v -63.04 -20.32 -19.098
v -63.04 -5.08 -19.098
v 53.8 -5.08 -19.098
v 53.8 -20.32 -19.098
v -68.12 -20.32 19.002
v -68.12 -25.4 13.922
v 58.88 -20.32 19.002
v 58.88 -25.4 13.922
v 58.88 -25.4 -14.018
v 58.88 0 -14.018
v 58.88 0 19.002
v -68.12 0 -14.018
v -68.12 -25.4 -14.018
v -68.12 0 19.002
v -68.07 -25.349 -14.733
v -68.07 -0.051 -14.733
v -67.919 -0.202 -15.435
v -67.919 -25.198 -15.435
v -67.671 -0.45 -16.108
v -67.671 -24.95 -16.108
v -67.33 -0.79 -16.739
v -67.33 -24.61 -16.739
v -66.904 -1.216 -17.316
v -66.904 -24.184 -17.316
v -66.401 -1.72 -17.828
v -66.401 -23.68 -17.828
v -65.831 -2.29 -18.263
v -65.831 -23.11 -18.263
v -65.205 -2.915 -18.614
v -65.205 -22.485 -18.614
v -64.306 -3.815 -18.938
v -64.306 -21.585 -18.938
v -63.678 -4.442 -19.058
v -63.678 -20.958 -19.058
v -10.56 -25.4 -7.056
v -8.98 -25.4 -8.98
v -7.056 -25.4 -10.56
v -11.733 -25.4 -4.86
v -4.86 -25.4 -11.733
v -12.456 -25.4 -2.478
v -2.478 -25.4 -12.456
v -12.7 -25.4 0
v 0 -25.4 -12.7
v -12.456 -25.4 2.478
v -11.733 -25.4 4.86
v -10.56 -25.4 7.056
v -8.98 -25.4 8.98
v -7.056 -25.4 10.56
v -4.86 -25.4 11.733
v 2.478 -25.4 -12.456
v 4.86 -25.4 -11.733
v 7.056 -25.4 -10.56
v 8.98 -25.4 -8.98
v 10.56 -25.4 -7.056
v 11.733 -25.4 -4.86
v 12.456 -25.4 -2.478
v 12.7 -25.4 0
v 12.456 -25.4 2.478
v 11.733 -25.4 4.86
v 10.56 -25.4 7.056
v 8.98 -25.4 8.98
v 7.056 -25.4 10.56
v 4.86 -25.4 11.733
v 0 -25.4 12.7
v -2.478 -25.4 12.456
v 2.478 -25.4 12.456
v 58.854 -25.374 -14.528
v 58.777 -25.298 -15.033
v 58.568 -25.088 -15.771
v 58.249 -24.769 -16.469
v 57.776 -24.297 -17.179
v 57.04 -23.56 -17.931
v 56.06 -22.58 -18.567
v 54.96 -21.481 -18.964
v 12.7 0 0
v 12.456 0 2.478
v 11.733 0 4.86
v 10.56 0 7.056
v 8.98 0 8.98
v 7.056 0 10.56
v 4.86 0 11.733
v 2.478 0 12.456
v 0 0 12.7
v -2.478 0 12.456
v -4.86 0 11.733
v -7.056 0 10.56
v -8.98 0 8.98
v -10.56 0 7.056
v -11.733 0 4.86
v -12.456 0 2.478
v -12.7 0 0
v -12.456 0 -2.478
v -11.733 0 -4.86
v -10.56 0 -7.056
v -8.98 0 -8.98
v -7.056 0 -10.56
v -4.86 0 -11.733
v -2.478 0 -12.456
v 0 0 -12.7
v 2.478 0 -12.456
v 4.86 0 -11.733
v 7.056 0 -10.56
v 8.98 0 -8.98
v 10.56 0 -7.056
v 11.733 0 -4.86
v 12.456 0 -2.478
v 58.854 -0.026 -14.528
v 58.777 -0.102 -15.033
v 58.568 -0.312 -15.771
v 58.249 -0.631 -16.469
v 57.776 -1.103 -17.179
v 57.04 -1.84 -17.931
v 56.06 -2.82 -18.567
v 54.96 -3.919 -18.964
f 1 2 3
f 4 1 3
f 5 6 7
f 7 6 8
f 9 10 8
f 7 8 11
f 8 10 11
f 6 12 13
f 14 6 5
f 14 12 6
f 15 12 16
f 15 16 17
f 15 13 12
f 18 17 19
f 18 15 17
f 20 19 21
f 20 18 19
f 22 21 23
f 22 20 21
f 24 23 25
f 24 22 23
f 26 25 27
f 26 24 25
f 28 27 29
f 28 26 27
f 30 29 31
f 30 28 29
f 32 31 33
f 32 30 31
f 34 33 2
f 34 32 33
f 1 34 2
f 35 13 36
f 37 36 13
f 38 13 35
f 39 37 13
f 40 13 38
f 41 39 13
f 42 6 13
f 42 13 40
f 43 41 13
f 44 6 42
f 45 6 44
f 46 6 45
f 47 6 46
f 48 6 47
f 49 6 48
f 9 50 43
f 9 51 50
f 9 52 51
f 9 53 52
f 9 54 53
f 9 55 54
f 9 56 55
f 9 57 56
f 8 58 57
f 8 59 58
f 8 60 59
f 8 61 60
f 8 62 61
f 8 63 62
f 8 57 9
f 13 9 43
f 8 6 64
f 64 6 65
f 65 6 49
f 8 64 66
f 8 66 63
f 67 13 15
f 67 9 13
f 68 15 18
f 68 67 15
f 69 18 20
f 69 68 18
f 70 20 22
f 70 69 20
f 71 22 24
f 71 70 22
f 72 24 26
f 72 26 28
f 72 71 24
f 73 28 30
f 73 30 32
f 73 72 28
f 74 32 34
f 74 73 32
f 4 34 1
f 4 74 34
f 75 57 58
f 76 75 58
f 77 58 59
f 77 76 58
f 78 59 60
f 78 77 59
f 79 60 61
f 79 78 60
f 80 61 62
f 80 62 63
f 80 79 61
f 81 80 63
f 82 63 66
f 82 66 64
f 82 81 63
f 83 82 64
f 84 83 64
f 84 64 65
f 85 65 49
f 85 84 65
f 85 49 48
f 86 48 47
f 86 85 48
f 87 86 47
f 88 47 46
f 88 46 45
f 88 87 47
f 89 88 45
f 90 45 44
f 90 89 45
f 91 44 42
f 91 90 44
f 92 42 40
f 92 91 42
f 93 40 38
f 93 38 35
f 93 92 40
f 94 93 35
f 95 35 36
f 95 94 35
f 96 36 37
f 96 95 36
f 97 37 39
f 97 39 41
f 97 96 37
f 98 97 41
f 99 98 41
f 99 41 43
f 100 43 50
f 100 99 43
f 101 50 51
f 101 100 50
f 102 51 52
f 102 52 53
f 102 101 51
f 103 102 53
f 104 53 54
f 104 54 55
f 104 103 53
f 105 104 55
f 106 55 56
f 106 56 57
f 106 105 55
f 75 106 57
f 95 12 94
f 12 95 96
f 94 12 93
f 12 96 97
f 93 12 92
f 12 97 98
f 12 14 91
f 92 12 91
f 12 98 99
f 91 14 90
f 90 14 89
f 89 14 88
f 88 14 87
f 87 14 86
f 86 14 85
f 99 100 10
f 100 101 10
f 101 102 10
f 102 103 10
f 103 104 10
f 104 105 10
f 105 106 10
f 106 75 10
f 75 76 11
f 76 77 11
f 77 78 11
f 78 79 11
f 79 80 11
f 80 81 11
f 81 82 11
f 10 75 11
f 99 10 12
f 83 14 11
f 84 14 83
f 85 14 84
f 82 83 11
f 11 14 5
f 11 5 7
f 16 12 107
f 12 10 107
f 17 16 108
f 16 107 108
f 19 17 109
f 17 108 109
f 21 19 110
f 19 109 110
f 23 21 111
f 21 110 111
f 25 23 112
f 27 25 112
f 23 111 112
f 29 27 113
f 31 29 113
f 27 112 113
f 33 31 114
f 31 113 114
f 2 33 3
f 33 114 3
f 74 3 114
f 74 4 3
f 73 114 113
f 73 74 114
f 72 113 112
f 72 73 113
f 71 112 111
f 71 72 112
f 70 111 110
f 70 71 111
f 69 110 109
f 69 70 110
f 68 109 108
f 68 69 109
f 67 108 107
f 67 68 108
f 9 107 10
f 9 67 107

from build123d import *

# Parameters (mm, degrees)
F0_W     = 127
F0_H     = 38.1
F0_R     = 12.7
F1_DEPTH = 25.4
F2_SIZE  = 5.08
F3_R     = 5.08


with BuildPart() as f1:
    # F0 (on Front) → F1 (new body)
    with BuildSketch(Plane.XZ):
        with Locations((-4.620358, -0.047909)):
            Rectangle(F0_W, F0_H)
        Circle(F0_R, mode=Mode.SUBTRACT)
    extrude(amount=F1_DEPTH)

    # F2
    f2_edges = [f1.edges().sort_by_distance(p)[0] for p in [
        (-4.620358, -25.4, 19.002091),
    ]]
    chamfer(f2_edges, length=F2_SIZE)

    # F3
    f3_edges = [f1.edges().sort_by_distance(p)[0] for p in [
        (-68.120358, -12.7, -19.097909),
        (58.879642, -12.7, -19.097909),
        (-4.620358, 0, -19.097909),
        (-4.620358, -25.4, -19.097909),
    ]]
    fillet(f3_edges, radius=F3_R)


solid = f1.part
